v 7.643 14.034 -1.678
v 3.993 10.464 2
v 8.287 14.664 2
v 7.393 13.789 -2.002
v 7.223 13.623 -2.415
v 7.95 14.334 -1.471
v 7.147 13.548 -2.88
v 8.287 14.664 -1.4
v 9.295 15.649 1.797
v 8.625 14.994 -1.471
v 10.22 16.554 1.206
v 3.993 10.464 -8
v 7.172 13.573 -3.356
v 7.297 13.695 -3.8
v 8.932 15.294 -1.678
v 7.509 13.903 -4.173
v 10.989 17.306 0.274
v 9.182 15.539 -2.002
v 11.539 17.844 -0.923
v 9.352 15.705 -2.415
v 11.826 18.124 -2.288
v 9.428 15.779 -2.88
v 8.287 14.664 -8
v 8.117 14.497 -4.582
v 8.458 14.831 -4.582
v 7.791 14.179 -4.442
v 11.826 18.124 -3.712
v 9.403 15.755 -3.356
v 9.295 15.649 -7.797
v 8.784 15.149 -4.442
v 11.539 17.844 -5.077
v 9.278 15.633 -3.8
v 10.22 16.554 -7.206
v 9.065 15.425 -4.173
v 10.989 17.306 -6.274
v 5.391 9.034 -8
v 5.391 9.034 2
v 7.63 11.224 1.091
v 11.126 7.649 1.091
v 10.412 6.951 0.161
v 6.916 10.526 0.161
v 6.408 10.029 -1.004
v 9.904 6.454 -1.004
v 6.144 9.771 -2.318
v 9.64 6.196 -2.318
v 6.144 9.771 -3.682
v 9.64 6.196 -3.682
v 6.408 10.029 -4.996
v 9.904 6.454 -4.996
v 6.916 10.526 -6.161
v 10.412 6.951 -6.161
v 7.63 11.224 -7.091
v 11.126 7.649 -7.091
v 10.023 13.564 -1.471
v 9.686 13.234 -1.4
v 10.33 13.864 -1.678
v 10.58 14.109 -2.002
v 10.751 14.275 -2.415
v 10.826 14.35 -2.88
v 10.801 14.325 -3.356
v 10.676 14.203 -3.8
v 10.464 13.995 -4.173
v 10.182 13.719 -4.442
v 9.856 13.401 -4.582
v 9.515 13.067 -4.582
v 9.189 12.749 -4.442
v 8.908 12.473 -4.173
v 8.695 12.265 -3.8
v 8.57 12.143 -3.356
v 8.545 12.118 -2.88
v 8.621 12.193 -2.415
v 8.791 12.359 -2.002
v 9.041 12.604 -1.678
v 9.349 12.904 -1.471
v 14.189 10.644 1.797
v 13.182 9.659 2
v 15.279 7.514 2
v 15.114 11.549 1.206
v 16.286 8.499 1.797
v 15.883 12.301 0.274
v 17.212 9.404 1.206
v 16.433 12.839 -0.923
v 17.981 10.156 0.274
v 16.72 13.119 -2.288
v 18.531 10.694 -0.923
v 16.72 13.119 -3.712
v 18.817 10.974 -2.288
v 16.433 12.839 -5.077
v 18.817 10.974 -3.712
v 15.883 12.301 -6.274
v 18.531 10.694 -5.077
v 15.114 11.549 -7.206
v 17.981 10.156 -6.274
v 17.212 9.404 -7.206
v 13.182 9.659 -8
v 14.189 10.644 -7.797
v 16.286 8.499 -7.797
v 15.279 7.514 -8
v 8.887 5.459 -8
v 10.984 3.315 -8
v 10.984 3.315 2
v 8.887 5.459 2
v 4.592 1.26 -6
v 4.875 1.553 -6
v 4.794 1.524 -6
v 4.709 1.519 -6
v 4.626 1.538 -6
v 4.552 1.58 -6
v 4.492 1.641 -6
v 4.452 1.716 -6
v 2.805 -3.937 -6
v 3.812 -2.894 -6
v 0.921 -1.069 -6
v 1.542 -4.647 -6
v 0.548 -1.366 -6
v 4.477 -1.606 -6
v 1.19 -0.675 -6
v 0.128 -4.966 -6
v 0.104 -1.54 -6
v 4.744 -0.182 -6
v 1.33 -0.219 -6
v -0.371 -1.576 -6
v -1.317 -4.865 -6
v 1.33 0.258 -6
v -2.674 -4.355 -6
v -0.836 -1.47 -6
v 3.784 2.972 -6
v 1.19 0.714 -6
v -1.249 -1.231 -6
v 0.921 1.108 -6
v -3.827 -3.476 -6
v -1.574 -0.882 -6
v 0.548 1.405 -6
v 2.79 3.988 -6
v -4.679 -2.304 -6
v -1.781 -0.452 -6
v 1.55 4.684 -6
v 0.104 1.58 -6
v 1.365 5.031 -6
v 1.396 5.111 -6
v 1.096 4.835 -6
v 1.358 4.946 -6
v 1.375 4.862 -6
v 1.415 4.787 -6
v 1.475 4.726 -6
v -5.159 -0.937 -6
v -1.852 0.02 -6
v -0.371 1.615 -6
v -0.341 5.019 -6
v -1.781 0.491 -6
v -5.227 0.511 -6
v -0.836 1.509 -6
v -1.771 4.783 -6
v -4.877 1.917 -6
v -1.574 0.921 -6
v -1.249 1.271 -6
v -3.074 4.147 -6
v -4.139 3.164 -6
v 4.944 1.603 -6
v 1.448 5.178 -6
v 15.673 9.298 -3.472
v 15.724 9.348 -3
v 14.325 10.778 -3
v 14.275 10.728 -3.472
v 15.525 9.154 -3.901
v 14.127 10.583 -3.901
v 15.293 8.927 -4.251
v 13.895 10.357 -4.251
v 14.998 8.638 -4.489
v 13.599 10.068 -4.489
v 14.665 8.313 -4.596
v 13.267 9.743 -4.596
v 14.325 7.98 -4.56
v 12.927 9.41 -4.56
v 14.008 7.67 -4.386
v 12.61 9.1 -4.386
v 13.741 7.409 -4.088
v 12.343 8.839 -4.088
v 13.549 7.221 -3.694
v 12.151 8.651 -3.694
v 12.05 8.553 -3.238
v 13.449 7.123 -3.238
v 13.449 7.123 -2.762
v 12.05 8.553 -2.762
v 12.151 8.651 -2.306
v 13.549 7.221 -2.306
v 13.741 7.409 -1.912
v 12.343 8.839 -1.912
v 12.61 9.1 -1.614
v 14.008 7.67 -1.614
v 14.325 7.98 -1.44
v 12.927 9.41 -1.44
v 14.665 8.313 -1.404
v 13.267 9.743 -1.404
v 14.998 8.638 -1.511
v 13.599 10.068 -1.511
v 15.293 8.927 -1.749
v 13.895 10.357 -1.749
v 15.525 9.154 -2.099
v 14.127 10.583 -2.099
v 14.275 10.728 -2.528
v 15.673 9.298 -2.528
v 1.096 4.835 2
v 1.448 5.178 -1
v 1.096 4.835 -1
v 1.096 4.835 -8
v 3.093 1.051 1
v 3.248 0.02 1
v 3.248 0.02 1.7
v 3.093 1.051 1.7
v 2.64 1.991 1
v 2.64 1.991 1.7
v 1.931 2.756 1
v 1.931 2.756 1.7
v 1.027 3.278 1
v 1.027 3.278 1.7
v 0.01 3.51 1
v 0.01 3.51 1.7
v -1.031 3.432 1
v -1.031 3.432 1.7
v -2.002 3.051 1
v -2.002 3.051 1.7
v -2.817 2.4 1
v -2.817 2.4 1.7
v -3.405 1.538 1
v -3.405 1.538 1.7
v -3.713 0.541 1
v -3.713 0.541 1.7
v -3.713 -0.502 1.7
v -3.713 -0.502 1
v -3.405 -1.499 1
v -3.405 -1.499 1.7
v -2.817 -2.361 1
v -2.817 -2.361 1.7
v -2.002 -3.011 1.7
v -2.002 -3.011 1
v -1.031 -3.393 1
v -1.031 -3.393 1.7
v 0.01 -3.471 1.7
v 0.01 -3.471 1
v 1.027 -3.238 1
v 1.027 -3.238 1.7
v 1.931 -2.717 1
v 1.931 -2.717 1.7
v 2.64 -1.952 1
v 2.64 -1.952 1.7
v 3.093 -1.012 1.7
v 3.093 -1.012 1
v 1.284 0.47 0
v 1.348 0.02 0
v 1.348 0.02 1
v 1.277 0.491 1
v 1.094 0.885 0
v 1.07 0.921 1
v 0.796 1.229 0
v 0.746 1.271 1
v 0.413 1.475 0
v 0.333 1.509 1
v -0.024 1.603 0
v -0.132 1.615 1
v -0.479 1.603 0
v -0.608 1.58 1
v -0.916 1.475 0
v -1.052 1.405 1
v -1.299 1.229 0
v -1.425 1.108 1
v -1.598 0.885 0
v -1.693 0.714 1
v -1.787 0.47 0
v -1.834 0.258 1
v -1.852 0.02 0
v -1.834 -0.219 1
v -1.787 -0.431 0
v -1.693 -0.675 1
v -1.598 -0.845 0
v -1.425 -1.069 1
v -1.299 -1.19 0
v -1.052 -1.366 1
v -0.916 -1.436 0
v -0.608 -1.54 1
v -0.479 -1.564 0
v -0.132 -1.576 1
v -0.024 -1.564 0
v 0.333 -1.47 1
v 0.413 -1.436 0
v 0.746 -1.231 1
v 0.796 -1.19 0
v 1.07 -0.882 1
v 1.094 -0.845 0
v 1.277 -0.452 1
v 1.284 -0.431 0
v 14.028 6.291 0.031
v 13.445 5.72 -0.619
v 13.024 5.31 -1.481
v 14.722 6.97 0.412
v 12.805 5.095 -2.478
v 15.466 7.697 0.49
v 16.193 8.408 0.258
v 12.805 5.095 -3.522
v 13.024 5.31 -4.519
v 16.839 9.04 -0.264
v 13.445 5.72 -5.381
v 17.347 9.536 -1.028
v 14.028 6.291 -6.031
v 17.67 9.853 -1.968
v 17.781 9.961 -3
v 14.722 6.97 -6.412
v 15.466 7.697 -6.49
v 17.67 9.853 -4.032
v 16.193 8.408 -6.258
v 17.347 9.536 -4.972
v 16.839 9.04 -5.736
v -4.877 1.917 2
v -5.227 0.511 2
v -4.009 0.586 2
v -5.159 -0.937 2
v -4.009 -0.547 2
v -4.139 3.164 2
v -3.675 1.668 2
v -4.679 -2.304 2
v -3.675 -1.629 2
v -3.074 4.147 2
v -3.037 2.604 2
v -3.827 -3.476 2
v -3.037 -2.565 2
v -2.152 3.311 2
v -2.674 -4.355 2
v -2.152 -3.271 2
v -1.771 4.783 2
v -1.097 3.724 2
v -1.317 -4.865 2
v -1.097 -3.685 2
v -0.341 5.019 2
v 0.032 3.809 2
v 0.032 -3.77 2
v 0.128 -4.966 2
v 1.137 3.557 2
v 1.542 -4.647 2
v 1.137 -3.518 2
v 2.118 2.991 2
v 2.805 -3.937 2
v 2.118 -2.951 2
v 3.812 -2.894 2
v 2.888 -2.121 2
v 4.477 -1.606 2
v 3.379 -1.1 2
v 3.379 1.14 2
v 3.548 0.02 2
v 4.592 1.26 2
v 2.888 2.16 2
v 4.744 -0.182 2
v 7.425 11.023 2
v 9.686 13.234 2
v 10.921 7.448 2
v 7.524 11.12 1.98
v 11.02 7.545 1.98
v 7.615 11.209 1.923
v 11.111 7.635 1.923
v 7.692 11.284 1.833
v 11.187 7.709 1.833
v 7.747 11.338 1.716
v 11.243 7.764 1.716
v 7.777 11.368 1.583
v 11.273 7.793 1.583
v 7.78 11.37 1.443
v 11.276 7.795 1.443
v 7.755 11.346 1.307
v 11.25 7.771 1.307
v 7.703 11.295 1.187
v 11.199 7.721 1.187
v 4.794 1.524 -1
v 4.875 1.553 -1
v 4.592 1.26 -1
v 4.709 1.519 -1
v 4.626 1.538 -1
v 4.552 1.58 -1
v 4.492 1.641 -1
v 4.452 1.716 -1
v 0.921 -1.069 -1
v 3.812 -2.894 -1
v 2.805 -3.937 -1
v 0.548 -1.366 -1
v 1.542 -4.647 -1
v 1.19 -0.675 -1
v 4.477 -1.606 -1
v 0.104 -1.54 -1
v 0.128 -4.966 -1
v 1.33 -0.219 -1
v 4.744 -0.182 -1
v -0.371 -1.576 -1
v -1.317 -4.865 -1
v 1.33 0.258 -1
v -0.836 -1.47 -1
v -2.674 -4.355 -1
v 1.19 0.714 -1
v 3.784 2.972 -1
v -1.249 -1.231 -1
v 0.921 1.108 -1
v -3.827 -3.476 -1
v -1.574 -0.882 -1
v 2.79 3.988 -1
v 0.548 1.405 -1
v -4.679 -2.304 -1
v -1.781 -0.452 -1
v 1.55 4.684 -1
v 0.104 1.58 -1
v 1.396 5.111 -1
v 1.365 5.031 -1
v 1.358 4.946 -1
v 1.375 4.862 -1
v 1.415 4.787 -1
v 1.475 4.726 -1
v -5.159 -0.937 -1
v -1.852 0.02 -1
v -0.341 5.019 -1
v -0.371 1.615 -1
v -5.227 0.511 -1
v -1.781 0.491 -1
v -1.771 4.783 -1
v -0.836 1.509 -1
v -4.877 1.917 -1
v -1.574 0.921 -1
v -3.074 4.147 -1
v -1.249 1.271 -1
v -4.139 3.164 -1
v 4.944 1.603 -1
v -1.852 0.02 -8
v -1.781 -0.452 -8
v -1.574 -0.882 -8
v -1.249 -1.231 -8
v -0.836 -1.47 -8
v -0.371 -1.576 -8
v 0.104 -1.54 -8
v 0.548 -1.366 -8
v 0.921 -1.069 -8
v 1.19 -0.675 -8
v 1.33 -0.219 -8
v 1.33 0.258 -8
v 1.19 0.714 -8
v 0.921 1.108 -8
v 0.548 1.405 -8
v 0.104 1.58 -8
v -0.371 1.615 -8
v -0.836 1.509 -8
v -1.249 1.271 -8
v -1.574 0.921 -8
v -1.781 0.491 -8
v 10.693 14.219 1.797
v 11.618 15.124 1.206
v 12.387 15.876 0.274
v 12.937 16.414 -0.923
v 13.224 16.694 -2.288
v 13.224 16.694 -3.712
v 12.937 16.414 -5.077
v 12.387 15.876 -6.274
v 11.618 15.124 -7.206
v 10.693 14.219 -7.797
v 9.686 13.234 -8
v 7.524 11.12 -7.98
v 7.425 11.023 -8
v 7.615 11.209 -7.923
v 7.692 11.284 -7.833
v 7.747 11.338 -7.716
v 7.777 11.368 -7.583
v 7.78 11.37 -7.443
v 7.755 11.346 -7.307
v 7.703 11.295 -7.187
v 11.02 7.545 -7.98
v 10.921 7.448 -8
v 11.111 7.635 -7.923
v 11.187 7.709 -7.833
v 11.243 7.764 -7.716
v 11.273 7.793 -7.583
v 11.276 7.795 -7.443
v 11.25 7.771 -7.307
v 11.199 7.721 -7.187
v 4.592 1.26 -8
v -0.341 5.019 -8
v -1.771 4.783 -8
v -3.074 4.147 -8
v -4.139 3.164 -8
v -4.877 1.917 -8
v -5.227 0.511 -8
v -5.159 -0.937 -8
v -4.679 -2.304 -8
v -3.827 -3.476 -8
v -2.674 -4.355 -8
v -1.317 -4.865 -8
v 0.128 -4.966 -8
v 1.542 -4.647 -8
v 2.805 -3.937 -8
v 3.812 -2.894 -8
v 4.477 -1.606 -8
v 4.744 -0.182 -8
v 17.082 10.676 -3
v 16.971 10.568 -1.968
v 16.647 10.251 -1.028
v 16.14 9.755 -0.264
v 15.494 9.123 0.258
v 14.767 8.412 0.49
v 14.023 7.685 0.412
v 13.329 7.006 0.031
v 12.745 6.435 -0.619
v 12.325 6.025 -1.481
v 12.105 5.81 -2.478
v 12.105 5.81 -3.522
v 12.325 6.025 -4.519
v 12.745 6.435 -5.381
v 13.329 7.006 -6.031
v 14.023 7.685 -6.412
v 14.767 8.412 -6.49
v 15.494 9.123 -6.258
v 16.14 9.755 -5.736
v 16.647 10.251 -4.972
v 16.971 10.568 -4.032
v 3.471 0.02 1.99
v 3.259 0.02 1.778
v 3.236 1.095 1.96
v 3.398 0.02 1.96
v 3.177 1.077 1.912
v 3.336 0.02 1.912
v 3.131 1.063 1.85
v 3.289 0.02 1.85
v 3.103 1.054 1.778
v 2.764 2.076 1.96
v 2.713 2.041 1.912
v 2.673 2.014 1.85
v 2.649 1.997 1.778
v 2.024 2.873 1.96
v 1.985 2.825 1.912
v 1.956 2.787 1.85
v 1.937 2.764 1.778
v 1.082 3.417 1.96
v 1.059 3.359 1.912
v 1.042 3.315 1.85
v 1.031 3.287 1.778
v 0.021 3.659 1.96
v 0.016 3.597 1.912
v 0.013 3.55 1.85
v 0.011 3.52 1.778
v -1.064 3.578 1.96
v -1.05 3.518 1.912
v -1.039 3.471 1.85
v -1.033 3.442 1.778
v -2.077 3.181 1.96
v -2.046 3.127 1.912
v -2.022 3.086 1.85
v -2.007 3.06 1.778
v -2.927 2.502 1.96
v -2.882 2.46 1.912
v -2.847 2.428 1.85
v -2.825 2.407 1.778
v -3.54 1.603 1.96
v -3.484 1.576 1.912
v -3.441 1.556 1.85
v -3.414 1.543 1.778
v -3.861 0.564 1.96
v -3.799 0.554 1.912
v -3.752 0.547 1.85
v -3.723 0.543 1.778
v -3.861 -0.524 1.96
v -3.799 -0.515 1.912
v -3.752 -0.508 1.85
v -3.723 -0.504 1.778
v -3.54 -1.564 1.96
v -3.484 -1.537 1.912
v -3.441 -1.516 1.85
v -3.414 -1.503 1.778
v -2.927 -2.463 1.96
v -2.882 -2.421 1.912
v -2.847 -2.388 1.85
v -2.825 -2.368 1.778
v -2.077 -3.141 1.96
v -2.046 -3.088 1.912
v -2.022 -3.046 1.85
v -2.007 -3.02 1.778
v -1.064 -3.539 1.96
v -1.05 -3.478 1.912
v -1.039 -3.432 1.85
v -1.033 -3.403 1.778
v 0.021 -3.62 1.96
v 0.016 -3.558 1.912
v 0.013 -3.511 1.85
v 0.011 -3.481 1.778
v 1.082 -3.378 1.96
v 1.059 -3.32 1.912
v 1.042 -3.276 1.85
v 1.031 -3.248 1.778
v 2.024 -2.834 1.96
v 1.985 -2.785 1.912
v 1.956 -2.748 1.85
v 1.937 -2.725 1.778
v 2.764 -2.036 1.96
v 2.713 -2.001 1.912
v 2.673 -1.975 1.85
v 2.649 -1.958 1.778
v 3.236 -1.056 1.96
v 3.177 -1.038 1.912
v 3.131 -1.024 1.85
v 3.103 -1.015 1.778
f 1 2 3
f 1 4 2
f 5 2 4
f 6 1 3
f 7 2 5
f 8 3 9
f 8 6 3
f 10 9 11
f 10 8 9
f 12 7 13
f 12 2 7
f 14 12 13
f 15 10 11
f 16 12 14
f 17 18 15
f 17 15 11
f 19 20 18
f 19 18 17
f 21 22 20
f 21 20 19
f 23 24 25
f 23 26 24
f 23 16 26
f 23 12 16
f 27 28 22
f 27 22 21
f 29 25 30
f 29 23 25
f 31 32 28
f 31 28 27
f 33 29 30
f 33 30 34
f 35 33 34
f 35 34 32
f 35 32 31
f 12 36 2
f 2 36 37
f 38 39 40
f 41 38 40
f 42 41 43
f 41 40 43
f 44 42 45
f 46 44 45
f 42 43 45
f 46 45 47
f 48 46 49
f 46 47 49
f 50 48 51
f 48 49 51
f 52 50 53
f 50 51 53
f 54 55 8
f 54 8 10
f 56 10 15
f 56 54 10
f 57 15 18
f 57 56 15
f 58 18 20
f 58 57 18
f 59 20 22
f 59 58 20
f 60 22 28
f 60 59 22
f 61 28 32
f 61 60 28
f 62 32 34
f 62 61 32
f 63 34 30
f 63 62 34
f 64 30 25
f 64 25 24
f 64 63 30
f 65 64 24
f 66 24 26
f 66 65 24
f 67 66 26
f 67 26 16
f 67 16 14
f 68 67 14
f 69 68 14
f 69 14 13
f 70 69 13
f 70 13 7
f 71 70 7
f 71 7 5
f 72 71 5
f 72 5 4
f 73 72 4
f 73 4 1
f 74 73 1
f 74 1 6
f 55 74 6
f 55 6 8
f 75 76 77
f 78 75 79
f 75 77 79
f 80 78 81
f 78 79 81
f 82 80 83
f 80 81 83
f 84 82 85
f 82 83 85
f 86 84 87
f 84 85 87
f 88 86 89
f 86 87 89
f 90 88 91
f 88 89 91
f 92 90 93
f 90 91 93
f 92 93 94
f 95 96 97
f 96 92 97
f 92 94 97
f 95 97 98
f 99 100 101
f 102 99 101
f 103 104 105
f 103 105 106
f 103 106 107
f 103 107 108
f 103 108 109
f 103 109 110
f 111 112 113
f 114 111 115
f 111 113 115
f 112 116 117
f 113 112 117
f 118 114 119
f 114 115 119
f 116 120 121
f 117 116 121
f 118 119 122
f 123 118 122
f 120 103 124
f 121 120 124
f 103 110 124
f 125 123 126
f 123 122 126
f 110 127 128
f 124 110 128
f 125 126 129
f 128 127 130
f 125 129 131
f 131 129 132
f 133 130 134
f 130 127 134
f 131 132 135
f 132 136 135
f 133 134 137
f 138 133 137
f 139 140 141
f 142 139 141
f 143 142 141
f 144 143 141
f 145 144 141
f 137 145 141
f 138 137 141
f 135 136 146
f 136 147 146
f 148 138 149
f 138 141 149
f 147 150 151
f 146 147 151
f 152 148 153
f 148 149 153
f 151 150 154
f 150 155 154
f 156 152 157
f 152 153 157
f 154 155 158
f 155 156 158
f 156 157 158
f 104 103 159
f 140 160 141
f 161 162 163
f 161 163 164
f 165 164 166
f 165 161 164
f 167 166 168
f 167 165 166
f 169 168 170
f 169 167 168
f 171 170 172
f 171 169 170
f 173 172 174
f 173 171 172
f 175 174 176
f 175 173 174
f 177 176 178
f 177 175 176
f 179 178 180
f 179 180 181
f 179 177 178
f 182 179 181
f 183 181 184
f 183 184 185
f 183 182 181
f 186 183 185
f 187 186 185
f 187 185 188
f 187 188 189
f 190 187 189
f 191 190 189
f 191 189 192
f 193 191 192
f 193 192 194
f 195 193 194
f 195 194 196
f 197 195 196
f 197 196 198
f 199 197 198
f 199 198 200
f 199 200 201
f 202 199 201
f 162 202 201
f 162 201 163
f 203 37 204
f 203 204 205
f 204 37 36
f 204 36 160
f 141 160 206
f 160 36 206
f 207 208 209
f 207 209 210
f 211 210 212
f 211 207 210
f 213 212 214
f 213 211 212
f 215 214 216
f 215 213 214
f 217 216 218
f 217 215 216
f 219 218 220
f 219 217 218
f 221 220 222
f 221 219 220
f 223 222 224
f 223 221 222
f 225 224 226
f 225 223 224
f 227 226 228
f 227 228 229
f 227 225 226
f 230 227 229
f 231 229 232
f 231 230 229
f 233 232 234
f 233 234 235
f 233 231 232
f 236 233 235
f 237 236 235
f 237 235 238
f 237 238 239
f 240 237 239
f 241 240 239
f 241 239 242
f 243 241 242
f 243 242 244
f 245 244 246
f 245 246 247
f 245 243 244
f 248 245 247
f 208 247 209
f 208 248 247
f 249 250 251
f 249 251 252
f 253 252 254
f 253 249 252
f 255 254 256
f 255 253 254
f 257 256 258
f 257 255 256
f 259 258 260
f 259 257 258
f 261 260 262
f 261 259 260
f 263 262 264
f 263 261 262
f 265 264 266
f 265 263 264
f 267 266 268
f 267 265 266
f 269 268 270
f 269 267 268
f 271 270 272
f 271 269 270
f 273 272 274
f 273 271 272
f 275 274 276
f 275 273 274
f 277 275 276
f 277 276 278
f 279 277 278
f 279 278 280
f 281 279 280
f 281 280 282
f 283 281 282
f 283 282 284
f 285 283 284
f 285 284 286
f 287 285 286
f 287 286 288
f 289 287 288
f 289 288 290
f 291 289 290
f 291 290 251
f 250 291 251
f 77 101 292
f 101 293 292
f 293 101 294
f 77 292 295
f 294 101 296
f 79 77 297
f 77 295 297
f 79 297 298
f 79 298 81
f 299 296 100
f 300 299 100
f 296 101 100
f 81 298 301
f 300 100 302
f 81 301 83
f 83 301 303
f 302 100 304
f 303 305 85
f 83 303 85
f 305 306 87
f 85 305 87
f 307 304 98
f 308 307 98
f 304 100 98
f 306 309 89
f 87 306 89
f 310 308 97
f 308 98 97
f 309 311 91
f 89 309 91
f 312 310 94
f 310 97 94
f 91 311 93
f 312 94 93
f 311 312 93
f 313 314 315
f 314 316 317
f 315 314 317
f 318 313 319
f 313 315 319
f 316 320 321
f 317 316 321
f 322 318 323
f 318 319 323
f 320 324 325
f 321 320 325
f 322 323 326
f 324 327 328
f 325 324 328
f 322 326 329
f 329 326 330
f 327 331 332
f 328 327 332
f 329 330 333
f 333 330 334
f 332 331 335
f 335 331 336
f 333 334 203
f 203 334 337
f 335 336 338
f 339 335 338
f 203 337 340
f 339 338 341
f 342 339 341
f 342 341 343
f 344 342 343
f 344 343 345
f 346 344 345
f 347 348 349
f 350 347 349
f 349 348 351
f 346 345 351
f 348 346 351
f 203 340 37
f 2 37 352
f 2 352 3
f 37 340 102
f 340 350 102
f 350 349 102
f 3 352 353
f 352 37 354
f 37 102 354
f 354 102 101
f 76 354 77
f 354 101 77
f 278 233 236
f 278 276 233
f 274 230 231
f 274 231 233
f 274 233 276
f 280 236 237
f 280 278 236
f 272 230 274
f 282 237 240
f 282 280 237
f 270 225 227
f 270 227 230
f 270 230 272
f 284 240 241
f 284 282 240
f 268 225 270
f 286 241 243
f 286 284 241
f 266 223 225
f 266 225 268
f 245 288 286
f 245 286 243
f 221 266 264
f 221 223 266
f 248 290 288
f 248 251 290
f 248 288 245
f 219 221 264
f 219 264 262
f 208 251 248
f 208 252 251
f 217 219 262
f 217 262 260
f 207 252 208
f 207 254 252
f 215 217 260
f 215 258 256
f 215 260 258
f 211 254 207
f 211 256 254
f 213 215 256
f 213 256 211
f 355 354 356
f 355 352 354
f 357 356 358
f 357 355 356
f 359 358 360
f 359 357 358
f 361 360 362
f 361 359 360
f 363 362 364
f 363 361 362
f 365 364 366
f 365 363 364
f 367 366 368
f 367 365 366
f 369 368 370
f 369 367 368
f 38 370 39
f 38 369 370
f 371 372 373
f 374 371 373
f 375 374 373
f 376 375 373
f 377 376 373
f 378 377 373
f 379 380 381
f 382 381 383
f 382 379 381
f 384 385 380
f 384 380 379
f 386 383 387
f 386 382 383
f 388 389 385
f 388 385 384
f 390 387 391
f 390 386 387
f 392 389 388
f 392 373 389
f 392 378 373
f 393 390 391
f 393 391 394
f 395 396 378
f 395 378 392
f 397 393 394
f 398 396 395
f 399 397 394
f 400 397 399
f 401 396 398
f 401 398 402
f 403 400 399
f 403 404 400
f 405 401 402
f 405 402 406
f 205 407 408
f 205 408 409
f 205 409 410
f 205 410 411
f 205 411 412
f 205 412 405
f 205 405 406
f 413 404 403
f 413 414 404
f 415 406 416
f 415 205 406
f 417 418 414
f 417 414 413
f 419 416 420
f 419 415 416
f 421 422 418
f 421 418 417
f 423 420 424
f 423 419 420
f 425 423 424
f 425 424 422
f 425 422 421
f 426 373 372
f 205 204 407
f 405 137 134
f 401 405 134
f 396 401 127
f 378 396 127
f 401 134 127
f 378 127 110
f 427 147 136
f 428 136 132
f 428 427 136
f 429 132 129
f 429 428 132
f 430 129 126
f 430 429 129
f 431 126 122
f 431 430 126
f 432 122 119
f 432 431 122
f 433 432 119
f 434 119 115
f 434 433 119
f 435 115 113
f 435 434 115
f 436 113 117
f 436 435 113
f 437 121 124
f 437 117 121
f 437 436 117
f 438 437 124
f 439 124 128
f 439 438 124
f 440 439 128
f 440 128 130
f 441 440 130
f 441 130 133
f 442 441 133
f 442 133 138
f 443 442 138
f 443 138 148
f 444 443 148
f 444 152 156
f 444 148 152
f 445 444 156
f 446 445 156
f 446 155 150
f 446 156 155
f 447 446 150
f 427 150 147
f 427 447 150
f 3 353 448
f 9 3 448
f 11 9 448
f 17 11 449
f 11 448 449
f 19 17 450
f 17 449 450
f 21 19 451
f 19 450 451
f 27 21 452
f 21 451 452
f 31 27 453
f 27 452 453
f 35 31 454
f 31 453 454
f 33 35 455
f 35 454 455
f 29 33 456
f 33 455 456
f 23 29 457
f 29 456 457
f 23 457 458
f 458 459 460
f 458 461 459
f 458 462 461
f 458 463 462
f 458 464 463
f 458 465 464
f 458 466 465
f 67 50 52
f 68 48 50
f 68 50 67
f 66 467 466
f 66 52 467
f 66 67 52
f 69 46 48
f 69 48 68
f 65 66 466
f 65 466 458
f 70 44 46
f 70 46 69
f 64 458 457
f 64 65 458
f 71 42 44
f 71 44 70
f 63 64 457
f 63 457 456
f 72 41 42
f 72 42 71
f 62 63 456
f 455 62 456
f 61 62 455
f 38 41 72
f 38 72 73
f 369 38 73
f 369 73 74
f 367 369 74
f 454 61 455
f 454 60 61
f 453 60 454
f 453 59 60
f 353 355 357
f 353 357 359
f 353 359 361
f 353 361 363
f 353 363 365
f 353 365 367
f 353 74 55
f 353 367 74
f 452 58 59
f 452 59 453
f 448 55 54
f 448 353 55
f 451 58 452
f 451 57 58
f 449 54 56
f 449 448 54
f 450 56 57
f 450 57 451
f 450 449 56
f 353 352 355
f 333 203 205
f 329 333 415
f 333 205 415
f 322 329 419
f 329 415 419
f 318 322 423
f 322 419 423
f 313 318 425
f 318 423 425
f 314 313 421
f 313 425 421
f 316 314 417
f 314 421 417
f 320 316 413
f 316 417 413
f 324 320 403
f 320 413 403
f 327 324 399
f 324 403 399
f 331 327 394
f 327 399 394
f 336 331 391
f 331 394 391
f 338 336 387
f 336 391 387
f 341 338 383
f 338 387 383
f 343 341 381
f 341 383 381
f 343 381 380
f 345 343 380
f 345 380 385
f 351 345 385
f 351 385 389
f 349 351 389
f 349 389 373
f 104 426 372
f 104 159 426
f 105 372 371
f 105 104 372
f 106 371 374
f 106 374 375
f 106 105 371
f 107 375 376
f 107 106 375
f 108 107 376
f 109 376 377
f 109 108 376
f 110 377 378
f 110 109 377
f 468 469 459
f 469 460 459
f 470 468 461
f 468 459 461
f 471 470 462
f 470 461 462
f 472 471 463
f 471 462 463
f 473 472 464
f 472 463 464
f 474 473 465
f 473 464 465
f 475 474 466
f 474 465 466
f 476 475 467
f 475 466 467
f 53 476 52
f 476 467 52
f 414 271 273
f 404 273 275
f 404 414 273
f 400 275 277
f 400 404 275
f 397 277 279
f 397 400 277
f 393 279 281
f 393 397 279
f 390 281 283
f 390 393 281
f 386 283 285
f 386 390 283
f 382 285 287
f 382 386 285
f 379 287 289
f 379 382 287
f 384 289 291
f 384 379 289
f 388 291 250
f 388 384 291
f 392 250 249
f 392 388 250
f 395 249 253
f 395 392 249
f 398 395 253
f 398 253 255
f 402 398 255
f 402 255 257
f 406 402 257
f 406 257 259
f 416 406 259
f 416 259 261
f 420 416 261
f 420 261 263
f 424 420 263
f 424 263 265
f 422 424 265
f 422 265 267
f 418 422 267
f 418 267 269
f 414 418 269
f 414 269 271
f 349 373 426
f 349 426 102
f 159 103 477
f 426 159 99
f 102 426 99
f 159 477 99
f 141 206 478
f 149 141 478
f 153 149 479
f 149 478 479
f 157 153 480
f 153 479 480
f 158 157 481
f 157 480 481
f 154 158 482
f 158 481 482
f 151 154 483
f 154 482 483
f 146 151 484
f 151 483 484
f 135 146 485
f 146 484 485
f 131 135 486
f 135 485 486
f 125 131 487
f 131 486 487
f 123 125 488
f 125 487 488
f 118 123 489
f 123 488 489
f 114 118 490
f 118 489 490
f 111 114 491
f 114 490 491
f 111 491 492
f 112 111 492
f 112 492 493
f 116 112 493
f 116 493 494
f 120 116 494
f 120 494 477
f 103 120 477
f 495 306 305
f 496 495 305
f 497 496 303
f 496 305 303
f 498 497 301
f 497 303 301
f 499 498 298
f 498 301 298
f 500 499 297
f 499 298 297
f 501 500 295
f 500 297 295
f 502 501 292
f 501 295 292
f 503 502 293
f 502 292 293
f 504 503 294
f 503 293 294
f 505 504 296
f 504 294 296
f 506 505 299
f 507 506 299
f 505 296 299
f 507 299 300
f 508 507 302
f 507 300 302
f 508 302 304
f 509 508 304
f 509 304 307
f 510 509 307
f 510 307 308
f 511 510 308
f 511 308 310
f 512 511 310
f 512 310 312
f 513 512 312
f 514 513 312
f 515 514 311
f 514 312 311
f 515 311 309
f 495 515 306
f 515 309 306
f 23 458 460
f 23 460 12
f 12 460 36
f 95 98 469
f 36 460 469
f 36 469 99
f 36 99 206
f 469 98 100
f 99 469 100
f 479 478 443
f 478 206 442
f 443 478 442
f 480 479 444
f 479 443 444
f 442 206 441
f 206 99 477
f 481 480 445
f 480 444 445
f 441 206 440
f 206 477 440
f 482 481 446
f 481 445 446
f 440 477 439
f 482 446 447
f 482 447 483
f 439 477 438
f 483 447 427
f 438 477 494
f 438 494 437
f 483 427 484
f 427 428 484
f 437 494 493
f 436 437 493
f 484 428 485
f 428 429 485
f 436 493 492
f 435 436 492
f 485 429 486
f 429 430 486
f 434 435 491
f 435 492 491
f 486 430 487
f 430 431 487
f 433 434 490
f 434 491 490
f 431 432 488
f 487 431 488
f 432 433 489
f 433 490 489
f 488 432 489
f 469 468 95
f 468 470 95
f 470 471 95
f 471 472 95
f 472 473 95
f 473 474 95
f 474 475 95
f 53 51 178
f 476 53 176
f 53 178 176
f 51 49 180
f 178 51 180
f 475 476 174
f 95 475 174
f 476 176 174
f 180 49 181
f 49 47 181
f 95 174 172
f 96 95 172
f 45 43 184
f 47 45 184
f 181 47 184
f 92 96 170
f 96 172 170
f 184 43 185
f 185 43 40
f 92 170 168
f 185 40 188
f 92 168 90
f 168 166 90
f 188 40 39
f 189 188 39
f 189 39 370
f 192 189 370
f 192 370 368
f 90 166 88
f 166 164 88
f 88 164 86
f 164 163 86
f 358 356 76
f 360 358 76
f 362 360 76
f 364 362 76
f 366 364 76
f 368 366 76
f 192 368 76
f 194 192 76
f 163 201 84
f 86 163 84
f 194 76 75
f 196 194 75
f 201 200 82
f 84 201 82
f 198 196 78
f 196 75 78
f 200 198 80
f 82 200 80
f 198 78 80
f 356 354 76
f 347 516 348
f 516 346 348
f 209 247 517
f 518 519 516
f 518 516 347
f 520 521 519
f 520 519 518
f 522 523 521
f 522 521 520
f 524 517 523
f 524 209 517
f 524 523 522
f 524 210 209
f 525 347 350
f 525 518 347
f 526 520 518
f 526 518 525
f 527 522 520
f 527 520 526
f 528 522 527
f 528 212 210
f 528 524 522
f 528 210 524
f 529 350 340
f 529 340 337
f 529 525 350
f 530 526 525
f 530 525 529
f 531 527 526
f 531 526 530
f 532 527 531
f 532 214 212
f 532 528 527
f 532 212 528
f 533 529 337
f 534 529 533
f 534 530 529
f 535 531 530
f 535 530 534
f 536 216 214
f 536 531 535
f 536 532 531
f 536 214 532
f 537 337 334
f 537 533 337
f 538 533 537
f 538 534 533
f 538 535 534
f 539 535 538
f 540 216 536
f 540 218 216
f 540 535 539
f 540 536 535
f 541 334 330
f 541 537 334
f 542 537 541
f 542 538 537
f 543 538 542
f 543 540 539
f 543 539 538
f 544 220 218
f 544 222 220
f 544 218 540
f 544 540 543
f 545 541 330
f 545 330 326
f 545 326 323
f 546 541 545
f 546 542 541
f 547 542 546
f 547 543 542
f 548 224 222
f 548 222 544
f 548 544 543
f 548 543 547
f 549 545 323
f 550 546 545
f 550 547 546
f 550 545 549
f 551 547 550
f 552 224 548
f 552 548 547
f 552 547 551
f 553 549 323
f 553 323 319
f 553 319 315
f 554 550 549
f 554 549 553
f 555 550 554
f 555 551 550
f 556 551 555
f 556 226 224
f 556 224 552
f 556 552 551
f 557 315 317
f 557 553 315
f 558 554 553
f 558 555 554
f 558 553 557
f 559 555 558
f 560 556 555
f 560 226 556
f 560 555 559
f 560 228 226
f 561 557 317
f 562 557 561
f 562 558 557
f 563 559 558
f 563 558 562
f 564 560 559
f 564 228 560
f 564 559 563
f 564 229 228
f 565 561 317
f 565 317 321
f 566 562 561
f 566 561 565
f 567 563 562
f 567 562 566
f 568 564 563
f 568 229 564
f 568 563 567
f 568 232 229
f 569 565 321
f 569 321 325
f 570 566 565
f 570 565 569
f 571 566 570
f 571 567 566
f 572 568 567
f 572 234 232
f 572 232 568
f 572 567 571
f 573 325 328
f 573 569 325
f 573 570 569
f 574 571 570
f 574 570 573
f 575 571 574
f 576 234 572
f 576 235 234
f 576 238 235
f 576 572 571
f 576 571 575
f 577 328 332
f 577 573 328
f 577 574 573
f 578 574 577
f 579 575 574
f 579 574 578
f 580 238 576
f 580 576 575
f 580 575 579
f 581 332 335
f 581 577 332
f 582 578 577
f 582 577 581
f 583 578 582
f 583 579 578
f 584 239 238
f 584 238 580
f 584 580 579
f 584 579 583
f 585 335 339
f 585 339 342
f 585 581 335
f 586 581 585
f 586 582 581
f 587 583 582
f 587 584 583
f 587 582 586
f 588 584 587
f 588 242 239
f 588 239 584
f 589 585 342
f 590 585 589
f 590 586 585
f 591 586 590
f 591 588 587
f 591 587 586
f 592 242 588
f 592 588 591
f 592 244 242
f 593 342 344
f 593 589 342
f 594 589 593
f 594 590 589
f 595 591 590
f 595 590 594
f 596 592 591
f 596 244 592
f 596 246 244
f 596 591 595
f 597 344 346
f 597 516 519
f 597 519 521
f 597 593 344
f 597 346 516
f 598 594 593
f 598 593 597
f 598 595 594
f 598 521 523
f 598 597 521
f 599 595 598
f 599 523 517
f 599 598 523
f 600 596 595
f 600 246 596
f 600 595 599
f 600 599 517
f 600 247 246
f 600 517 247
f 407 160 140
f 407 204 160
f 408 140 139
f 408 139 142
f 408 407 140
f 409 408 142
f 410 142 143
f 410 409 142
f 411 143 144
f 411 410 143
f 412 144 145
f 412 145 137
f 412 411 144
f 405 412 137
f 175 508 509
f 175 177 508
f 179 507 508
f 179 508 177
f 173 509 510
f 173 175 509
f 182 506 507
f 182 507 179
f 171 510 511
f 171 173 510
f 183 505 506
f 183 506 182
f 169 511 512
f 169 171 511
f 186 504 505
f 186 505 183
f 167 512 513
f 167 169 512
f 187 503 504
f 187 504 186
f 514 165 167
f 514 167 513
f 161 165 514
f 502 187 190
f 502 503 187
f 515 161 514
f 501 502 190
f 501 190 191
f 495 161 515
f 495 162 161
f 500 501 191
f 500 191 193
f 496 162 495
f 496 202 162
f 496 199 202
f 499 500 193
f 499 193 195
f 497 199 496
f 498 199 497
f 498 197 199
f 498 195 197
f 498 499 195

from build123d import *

# Parameters (mm, degrees)
SKETCH1_R               = 1.6
BOSS_EXTRUDE1_DEPTH     = 2
BOSS_EXTRUDE2_START     = -8
SKETCH1_3_R             = 1.6
BOSS_EXTRUDE2_DEPTH     = 8
SKETCH2_R               = 5
CUT_EXTRUDE1_DEPTH      = 5
SKETCH7_R               = 1.6
BOSS_EXTRUDE5_DEPTH     = 2
BOSS_EXTRUDE6_START     = -8
BOSS_EXTRUDE6_OUTLINE_R = 1.6
BOSS_EXTRUDE6_DEPTH     = 8
CUT_EXTRUDE4_START      = 5
SKETCH8_R               = 5
CUT_EXTRUDE4_DEPTH      = 5
SKETCH10_R              = 3.5
SKETCH10_R_2            = 1.6
CUT_EXTRUDE5_DEPTH      = 1
FILLET2_R               = 0.5
FILLET3_R               = 0.3
CUT_EXTRUDE6_START      = -1
SKETCH11_R              = 3.5
SKETCH11_R_2            = 1.6
CUT_EXTRUDE6_DEPTH      = 1
FILLET4_R               = 0.3


# Read off the part's stored shape, not the designer's step: Boss-Extrude6
with BuildPart() as part:
    # Sketch1 → Boss-Extrude1 (new body)
    with BuildSketch(Plane.XY):
        with BuildLine():
            Line((13.181503179, 9.65917228), (9.685706637, 13.234001861))
            Line((9.685706637, 13.234001861), (1.09631205, 4.834503308))
            ThreePointArc((1.09631205, 4.834503308), (-3.826512492, -3.476156637), (4.592108592, 1.259673726))
            Line((4.592108592, 1.259673726), (13.181503179, 9.65917228))
        make_face()
        with Locations((-0.251682911, 0.019639905)):
            Circle(SKETCH1_R, mode=Mode.SUBTRACT)
    extrude(amount=BOSS_EXTRUDE1_DEPTH)

    # Sketch1<3> → Boss-Extrude2 (add)
    with BuildSketch(Plane.XY.offset(BOSS_EXTRUDE2_START)):
        with BuildLine():
            Line((13.181503179, 9.65917228), (9.685706637, 13.234001861))
            Line((9.685706637, 13.234001861), (1.09631205, 4.834503308))
            ThreePointArc((1.09631205, 4.834503308), (-3.826512492, -3.476156637), (4.592108592, 1.259673726))
            Line((4.592108592, 1.259673726), (13.181503179, 9.65917228))
        make_face()
        with Locations(Location((-0.251682911, 0.019639905, 0), (0, 0, 180))):
            Circle(SKETCH1_3_R, mode=Mode.SUBTRACT)
    extrude(amount=BOSS_EXTRUDE2_DEPTH)

    # Sketch2 → Cut-Extrude1 (cut)
    with BuildSketch(Plane(origin=(0, 0, -6), x_dir=(-1, 0, 0), z_dir=(0, 0, -1))):
        with Locations((0.251682911, 0.019639905)):
            Circle(SKETCH2_R)
    extrude(amount=-CUT_EXTRUDE1_DEPTH, mode=Mode.SUBTRACT)

    # Sketch7 → Boss-Extrude5 (add)
    with BuildSketch(Plane(origin=(-1.880744352, 1.923264258, 0), x_dir=(0.7149659162500773, 0.6991593084560109, 0), z_dir=(-0.6991593084560109, 0.7149659162500773, 0))):
        with BuildLine():
            Line((16.17762571, 8), (10.170769724, 8))
            Line((10.170769724, 8), (10.170769724, -2))
            Line((10.170769724, -2), (16.17762571, -2))
            ThreePointArc((16.17762571, -2), (21.17762571, 3), (16.17762571, 8))
        make_face()
        with Locations(Location((16.17762571, 3, 0), (0, 0, 270))):
            Circle(SKETCH7_R, mode=Mode.SUBTRACT)
    extrude(amount=BOSS_EXTRUDE5_DEPTH)

    # Boss-Extrude6 outline → Boss-Extrude6 (add)
    with BuildSketch(Plane(origin=(-1.880744352, 1.923264258, 0), x_dir=(0.7149659162500773, 0.6991593084560109, 0), z_dir=(-0.6991593084560109, 0.7149659162500773, 0)).offset(BOSS_EXTRUDE6_START)):
        with BuildLine():
            Line((10.170769724, 8), (10.170769724, -2))
            Line((10.170769724, -2), (16.17762571, -2))
            ThreePointArc((16.17762571, -2), (21.17762571, 3), (16.17762571, 8))
            Line((16.17762571, 8), (10.170769724, 8))
        make_face()
        with Locations((16.17762571, 3)):
            Circle(BOSS_EXTRUDE6_OUTLINE_R, mode=Mode.SUBTRACT)
    extrude(amount=BOSS_EXTRUDE6_DEPTH)

    # Sketch8 → Cut-Extrude4 (cut)
    with BuildSketch(Plane(origin=(-1.880744352, 1.923264258, 0), x_dir=(0.7149659162500772, 0.699159308456011, 0), z_dir=(0.699159308456011, -0.7149659162500772, 0)).offset(CUT_EXTRUDE4_START)):
        with Locations((16.17762571, -3)):
            Circle(SKETCH8_R)
    extrude(amount=-CUT_EXTRUDE4_DEPTH, mode=Mode.SUBTRACT)

    # Sketch10 → Cut-Extrude5 (cut)
    with BuildSketch(Plane(origin=(3.712530116, -3.796463072, 0), x_dir=(0.7149659162500772, 0.699159308456011, 0), z_dir=(0.699159308456011, -0.7149659162500772, 0))):
        with Locations((16.17762571, -3)):
            Circle(SKETCH10_R)
        with Locations((16.17762571, -3)):
            Circle(SKETCH10_R_2, mode=Mode.SUBTRACT)
    extrude(amount=-CUT_EXTRUDE5_DEPTH, mode=Mode.SUBTRACT)

    # Fillet2
    fillet2_edges = [part.edges().sort_by_distance(p)[0] for p in [
        (11.433604908, 11.446587071, 2),
        (11.433604908, 11.446587071, -8),
    ]]
    fillet(fillet2_edges, radius=FILLET2_R)

    # Fillet3
    fillet3_edges = [part.edges().sort_by_distance(p)[0] for p in [
        (4.592108592, 1.259673726, -3.5),
        (1.09631205, 4.834503308, -3.5),
    ]]
    fillet(fillet3_edges, radius=FILLET3_R)

    # Sketch11 → Cut-Extrude6 (cut)
    with BuildSketch(Plane.XY.offset(2).offset(CUT_EXTRUDE6_START)):
        with Locations((-0.251682911, 0.019639905)):
            Circle(SKETCH11_R)
        with Locations(Location((-0.251682911, 0.019639905, 0), (0, 0, 180))):
            Circle(SKETCH11_R_2, mode=Mode.SUBTRACT)
    extrude(amount=CUT_EXTRUDE6_DEPTH, mode=Mode.SUBTRACT)

    # Fillet4
    fillet4_edges = [part.edges().sort_by_distance(p)[0] for p in [
        (-3.751682911, 0.019639905, 2),
    ]]
    fillet(fillet4_edges, radius=FILLET4_R)


solid = part.part
